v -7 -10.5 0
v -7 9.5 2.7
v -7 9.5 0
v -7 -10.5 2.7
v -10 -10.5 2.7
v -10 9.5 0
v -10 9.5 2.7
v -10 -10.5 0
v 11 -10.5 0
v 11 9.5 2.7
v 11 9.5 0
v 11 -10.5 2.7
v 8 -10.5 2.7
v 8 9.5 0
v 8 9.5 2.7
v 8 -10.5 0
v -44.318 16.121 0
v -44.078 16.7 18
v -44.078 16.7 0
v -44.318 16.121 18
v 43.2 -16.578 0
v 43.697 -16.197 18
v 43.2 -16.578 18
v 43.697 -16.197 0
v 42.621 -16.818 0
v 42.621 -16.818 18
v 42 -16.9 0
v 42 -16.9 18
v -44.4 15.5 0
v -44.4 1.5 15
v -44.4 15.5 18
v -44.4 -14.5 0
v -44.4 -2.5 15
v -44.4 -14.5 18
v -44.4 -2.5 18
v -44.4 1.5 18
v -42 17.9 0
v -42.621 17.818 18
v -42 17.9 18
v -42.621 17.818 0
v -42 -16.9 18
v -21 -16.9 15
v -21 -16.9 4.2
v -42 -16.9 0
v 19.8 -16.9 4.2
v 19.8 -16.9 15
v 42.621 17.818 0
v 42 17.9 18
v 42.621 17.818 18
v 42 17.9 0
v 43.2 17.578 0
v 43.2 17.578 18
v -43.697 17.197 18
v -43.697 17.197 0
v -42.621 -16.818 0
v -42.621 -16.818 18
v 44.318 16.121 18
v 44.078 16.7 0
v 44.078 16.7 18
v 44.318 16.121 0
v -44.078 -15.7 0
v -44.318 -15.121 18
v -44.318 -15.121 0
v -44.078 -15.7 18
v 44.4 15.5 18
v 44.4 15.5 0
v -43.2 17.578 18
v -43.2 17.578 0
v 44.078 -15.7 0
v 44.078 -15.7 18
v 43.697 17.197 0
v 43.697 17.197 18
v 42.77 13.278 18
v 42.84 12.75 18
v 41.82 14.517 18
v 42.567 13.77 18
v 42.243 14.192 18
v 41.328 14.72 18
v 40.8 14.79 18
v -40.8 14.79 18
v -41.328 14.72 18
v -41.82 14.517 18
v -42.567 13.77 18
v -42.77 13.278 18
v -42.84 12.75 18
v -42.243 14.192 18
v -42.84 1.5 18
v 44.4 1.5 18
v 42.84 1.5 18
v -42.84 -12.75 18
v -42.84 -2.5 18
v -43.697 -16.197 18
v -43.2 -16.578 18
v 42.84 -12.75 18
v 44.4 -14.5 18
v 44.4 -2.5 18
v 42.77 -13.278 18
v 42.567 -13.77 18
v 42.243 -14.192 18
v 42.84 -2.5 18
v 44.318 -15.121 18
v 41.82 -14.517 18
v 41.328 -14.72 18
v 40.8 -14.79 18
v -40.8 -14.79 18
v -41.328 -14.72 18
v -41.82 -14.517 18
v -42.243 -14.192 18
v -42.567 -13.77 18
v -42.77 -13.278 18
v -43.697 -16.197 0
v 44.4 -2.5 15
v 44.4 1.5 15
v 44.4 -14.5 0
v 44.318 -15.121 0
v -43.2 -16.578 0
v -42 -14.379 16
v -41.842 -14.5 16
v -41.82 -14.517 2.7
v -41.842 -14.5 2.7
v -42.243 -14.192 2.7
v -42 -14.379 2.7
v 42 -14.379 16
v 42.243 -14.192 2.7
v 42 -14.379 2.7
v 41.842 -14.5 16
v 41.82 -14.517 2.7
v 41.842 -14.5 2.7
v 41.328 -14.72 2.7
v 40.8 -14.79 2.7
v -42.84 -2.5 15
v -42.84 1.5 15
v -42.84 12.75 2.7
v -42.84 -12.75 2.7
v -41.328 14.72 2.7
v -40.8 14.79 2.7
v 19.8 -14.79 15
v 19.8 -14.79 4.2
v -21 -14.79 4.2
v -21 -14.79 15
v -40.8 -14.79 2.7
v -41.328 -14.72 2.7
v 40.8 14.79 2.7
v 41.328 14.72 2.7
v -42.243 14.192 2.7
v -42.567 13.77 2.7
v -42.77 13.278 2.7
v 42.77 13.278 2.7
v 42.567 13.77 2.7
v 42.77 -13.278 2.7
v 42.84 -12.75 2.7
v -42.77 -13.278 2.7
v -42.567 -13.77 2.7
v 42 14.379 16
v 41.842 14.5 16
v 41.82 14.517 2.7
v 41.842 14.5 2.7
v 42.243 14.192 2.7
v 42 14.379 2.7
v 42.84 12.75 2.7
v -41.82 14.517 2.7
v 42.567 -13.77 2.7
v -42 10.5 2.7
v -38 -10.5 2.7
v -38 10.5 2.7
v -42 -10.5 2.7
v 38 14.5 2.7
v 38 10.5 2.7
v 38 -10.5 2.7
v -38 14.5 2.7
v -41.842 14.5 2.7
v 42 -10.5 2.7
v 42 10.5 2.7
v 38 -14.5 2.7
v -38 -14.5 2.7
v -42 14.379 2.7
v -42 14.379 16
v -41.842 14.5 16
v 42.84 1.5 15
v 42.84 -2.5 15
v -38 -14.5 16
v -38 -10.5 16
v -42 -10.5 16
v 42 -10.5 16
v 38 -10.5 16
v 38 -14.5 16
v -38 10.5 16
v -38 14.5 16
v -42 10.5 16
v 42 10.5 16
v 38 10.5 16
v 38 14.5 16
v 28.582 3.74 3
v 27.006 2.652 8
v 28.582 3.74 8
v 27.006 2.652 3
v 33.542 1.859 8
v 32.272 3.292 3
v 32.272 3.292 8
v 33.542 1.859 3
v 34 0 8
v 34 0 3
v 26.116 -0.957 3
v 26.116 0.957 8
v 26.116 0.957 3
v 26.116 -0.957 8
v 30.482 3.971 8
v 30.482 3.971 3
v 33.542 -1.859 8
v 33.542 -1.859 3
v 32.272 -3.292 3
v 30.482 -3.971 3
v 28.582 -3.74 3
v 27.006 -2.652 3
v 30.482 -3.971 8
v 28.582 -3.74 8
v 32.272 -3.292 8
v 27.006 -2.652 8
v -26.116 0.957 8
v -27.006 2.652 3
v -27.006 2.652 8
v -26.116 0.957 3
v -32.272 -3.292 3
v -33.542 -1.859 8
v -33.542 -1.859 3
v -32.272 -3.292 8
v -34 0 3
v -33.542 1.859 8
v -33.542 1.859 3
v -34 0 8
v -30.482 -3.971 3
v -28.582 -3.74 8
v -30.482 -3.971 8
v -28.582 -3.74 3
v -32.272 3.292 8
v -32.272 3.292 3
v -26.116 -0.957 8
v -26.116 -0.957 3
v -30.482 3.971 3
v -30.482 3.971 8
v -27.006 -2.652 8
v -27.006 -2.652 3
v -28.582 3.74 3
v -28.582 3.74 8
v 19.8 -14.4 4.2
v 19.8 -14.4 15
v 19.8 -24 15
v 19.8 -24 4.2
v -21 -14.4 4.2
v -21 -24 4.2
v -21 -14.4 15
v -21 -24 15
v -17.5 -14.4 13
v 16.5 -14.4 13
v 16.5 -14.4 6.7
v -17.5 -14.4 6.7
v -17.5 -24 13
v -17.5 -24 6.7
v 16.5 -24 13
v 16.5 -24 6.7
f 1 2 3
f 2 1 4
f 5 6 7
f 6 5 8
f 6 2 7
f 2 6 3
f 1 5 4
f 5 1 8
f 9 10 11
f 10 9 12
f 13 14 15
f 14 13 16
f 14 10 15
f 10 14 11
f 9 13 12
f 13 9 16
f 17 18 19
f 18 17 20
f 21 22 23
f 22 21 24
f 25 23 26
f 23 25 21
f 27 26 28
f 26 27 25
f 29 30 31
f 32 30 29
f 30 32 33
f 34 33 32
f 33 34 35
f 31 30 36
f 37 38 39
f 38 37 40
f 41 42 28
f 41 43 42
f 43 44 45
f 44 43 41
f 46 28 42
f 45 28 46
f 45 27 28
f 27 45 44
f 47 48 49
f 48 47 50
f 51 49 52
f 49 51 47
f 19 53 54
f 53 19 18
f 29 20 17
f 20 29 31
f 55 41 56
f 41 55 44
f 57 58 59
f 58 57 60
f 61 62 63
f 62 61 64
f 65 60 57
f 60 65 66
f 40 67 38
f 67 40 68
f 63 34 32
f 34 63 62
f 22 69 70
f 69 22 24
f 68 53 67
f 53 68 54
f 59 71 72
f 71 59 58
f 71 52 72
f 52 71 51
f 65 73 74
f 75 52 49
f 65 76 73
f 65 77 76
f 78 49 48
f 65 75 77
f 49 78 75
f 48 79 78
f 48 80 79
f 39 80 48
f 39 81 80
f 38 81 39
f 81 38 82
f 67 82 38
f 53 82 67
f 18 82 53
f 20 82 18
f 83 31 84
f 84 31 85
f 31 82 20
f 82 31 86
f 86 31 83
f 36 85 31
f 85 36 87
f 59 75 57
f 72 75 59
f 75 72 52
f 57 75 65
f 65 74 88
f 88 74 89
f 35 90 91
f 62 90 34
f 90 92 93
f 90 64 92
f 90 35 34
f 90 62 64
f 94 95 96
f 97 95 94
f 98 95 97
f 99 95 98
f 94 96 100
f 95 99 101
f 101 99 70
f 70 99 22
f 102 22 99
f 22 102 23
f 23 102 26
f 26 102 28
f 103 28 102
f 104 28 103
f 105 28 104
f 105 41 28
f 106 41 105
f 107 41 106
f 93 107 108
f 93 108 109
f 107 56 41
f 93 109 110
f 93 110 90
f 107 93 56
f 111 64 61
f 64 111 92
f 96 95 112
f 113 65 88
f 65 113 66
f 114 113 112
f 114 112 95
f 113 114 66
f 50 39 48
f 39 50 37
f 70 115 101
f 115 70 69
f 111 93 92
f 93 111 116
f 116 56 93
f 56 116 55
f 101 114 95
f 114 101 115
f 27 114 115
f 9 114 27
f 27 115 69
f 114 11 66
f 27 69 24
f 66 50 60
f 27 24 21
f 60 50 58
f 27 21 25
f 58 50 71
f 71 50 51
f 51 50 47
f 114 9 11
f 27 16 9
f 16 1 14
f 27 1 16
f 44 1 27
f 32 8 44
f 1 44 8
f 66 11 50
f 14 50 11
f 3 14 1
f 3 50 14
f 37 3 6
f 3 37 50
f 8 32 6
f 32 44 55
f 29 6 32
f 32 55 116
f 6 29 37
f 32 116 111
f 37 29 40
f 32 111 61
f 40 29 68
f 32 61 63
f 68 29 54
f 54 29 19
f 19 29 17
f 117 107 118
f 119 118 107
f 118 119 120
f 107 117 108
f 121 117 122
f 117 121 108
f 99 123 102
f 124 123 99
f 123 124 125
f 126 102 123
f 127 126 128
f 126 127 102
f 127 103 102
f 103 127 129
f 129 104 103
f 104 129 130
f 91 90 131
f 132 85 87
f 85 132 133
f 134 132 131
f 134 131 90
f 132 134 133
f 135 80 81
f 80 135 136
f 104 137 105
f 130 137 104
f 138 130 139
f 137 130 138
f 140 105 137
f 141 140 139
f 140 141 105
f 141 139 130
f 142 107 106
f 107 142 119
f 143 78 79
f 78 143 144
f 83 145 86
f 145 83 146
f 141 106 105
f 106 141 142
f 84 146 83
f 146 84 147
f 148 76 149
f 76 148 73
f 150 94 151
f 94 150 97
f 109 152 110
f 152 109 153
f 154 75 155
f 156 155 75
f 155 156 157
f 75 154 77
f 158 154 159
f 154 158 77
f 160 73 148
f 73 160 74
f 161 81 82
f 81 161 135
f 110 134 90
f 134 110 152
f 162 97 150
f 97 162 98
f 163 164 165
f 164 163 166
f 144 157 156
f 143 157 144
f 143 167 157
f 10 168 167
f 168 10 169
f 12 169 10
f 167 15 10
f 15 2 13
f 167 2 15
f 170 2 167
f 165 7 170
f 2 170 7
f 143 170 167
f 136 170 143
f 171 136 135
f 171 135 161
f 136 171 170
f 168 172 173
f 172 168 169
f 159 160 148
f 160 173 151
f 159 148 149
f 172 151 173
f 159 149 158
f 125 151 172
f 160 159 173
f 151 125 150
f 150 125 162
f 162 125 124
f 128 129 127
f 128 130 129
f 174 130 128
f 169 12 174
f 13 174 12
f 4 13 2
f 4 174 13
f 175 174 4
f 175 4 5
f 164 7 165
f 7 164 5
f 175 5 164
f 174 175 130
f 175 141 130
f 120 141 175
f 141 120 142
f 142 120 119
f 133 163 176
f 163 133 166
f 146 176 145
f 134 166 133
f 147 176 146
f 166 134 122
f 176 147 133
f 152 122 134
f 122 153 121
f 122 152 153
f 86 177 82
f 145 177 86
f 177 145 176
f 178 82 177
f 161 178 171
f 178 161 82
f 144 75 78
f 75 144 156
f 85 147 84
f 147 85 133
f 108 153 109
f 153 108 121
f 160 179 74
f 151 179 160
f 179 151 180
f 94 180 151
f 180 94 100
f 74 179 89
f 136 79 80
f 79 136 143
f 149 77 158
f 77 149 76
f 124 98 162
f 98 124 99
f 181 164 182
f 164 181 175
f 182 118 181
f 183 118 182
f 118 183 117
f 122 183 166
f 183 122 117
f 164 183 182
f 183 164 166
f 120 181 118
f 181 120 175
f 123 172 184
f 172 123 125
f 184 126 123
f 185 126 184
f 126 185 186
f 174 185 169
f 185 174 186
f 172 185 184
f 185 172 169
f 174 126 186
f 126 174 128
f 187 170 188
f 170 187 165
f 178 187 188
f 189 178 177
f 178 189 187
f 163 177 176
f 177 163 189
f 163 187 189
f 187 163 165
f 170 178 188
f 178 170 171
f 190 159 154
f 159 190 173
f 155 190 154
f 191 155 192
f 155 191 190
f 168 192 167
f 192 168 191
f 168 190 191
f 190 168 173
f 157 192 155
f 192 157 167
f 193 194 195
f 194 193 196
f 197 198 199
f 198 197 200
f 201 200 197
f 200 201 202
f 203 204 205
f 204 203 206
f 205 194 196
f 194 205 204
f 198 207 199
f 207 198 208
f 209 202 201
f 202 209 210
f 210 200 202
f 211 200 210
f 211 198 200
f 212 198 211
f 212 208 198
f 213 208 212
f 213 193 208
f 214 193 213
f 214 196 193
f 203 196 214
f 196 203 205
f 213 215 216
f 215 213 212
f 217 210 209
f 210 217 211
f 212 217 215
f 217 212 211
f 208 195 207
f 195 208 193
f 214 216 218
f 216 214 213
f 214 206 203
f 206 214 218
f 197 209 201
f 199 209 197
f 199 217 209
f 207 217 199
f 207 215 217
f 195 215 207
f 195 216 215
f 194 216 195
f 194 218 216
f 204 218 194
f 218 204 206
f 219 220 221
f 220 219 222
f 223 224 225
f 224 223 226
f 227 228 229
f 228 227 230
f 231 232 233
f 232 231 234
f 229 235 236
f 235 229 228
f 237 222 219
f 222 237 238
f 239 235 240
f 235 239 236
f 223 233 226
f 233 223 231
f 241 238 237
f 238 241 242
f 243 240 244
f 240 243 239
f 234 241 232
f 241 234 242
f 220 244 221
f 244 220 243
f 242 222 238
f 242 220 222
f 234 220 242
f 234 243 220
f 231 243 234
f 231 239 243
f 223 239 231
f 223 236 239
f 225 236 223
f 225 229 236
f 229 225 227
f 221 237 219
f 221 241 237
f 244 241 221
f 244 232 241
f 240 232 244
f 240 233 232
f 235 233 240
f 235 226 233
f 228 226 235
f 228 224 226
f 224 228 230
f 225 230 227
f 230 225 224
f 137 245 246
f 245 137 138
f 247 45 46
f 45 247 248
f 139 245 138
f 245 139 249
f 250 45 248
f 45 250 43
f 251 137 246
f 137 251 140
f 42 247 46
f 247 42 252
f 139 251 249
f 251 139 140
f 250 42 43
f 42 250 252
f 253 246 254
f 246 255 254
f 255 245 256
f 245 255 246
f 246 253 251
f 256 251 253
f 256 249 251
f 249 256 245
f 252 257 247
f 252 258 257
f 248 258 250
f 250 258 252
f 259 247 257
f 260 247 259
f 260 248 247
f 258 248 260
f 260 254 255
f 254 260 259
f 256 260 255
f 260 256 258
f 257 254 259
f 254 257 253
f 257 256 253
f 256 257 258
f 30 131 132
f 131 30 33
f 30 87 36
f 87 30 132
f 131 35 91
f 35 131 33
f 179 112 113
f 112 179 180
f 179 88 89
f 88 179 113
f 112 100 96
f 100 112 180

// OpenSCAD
/*
    Modeling the raspeberry pi night vision camera
    By dotnetmobile@gmail.com December 2019 
*/

camera_diameter = 16.5;

big_circle_diameter = 20;
small_circle_diameter = 9;

big_circle_x_pos = 30;
big_circle_y_pos = 0;

//small_circle_x_pos = big_circle_x_pos - big_circle_diameter / 2;
small_circle_x_pos = 20.5;
small_circle_y_pos = 10;

camera_x_pos = 0;
camera_y_pos = 0;

// back side
backside_width = 80;
backside_height = 25;
deepth_backside = 20;
backside_offset_x = -backside_width/2;
backside_offset_y = -backside_height/2;
//backside_offset_z = -18;
backside_offset_z = 0;

map_cube_x = 34;
map_cube_y = 8;
map_cube_z = 9;

irColor = "green";
cameraColor = "green";

backside_extrude_height = 15;

module roundedRectangle(width, height)  
{
    offset(2,$fn=24)
    square([width, height], center=false);
}

module irSensors()
{
    union()
    {
        // big circles
        translate([big_circle_x_pos,big_circle_y_pos,0])
        color(irColor)
        circle(d=big_circle_diameter);
        
        // small circles
        translate([0.95*small_circle_x_pos, 0.7*small_circle_y_pos, 0]) 
        color(irColor)
        circle(d=small_circle_diameter);
    }
}

module camera()
{
    translate([camera_x_pos, camera_y_pos, 0]) 
    color(cameraColor)
    circle(d=camera_diameter);
}

module night_vision_camera()
{
    irSensors();
    mirror([0,1,0]) mirror([1,0,0]) irSensors();
    camera();
}

module front_side()
{   
    difference() 
    {
        linear_extrude(height=2)
        color("green")
        translate([backside_offset_x, backside_offset_y, 1]) 
        roundedRectangle(backside_width, backside_height);
        
        linear_extrude(height=8) 
        night_vision_camera();
    }
}

module slots()
{
    translate([backside_offset_x-6,backside_offset_y+10,backside_offset_z])
    cube([5,4,3]);
    translate([-backside_offset_x,backside_offset_y+10,backside_offset_z])
    cube([5,4,3]);
}

module twin_pillars()
{
    translate([backside_offset_x-2,backside_offset_y-2,2])
    cube([4,4,16]);
    translate([-backside_offset_x-2,backside_offset_y-2,2])
    cube([4,4,16]);
}

module clipsing_pilars()
{
    twin_pillars();
    mirror([0,1,0])
    twin_pillars();
}

module backside_slots()
{
    translate([backside_offset_x/2+10, backside_offset_y+2, 0])
        cube([3,20,25]);
    translate([-backside_offset_x/2-12, backside_offset_y+2, 0])
        cube([3,20,25]);
}

module back_side()
{
    difference()
    {   
        // outside     
        translate([backside_offset_x-2,backside_offset_y-2,0])
        scale(1.2)
        color("blue")
        linear_extrude(height=backside_extrude_height)
        roundedRectangle(backside_width-10, backside_height);

        // inside
        scale(1.02)
        color("green")
        linear_extrude(height=backside_extrude_height)
        translate([backside_offset_x, backside_offset_y, 0])
        roundedRectangle(backside_width, backside_height);
        
        backside_slots();
    }
    // internal pilars for stopping front-side when clipsing it
    union()
    {
        clipsing_pilars();
        mirror([1,0,0]) clipsing_pilars();
    }
}

module single_support()
{
    translate([big_circle_x_pos,big_circle_y_pos,backside_extrude_height-5])
    cylinder(5,r=4);
}

module back_side_supports()
{
    single_support();
    mirror([1,0,0]) single_support();
}

module back_side_case()
{
    translate([0,0,backside_offset_z]) union()
    {
        back_side();

        back_side_supports();
    }
}

module extern_map_cube()
{
    translate([-map_cube_x/2-4,backside_offset_y*1.92,backside_offset_z+3]) 
    {
        color("red")
        scale(1.2)
        cube([map_cube_x,map_cube_y,map_cube_z]);
    }
}

module intern_map_cube()
{
        translate([-map_cube_x/2 -4 + 3.5,backside_offset_y*2.7,backside_offset_z+5]) 
        {
            cube([map_cube_x,map_cube_y*2.5,map_cube_z*0.7]);
        }
}

module nape_case()
{
    difference()
    {
        extern_map_cube();
        intern_map_cube();
    }
}

module night_vision_without_nape() 
{
    difference()
    {   back_side_case();
        
        // open the case for including the nape
        extern_map_cube();
    }
}

module night_vision_with_nape() 
{
    night_vision_without_nape();
    nape_case();
}

module night_vision_with_nape_and_holes()
{
    difference()
    {
        night_vision_with_nape();
        slots();
    }
}

// main part
//front_side();
backside_offset_z = -18;
mirror([0,0,1])
night_vision_with_nape_and_holes();
